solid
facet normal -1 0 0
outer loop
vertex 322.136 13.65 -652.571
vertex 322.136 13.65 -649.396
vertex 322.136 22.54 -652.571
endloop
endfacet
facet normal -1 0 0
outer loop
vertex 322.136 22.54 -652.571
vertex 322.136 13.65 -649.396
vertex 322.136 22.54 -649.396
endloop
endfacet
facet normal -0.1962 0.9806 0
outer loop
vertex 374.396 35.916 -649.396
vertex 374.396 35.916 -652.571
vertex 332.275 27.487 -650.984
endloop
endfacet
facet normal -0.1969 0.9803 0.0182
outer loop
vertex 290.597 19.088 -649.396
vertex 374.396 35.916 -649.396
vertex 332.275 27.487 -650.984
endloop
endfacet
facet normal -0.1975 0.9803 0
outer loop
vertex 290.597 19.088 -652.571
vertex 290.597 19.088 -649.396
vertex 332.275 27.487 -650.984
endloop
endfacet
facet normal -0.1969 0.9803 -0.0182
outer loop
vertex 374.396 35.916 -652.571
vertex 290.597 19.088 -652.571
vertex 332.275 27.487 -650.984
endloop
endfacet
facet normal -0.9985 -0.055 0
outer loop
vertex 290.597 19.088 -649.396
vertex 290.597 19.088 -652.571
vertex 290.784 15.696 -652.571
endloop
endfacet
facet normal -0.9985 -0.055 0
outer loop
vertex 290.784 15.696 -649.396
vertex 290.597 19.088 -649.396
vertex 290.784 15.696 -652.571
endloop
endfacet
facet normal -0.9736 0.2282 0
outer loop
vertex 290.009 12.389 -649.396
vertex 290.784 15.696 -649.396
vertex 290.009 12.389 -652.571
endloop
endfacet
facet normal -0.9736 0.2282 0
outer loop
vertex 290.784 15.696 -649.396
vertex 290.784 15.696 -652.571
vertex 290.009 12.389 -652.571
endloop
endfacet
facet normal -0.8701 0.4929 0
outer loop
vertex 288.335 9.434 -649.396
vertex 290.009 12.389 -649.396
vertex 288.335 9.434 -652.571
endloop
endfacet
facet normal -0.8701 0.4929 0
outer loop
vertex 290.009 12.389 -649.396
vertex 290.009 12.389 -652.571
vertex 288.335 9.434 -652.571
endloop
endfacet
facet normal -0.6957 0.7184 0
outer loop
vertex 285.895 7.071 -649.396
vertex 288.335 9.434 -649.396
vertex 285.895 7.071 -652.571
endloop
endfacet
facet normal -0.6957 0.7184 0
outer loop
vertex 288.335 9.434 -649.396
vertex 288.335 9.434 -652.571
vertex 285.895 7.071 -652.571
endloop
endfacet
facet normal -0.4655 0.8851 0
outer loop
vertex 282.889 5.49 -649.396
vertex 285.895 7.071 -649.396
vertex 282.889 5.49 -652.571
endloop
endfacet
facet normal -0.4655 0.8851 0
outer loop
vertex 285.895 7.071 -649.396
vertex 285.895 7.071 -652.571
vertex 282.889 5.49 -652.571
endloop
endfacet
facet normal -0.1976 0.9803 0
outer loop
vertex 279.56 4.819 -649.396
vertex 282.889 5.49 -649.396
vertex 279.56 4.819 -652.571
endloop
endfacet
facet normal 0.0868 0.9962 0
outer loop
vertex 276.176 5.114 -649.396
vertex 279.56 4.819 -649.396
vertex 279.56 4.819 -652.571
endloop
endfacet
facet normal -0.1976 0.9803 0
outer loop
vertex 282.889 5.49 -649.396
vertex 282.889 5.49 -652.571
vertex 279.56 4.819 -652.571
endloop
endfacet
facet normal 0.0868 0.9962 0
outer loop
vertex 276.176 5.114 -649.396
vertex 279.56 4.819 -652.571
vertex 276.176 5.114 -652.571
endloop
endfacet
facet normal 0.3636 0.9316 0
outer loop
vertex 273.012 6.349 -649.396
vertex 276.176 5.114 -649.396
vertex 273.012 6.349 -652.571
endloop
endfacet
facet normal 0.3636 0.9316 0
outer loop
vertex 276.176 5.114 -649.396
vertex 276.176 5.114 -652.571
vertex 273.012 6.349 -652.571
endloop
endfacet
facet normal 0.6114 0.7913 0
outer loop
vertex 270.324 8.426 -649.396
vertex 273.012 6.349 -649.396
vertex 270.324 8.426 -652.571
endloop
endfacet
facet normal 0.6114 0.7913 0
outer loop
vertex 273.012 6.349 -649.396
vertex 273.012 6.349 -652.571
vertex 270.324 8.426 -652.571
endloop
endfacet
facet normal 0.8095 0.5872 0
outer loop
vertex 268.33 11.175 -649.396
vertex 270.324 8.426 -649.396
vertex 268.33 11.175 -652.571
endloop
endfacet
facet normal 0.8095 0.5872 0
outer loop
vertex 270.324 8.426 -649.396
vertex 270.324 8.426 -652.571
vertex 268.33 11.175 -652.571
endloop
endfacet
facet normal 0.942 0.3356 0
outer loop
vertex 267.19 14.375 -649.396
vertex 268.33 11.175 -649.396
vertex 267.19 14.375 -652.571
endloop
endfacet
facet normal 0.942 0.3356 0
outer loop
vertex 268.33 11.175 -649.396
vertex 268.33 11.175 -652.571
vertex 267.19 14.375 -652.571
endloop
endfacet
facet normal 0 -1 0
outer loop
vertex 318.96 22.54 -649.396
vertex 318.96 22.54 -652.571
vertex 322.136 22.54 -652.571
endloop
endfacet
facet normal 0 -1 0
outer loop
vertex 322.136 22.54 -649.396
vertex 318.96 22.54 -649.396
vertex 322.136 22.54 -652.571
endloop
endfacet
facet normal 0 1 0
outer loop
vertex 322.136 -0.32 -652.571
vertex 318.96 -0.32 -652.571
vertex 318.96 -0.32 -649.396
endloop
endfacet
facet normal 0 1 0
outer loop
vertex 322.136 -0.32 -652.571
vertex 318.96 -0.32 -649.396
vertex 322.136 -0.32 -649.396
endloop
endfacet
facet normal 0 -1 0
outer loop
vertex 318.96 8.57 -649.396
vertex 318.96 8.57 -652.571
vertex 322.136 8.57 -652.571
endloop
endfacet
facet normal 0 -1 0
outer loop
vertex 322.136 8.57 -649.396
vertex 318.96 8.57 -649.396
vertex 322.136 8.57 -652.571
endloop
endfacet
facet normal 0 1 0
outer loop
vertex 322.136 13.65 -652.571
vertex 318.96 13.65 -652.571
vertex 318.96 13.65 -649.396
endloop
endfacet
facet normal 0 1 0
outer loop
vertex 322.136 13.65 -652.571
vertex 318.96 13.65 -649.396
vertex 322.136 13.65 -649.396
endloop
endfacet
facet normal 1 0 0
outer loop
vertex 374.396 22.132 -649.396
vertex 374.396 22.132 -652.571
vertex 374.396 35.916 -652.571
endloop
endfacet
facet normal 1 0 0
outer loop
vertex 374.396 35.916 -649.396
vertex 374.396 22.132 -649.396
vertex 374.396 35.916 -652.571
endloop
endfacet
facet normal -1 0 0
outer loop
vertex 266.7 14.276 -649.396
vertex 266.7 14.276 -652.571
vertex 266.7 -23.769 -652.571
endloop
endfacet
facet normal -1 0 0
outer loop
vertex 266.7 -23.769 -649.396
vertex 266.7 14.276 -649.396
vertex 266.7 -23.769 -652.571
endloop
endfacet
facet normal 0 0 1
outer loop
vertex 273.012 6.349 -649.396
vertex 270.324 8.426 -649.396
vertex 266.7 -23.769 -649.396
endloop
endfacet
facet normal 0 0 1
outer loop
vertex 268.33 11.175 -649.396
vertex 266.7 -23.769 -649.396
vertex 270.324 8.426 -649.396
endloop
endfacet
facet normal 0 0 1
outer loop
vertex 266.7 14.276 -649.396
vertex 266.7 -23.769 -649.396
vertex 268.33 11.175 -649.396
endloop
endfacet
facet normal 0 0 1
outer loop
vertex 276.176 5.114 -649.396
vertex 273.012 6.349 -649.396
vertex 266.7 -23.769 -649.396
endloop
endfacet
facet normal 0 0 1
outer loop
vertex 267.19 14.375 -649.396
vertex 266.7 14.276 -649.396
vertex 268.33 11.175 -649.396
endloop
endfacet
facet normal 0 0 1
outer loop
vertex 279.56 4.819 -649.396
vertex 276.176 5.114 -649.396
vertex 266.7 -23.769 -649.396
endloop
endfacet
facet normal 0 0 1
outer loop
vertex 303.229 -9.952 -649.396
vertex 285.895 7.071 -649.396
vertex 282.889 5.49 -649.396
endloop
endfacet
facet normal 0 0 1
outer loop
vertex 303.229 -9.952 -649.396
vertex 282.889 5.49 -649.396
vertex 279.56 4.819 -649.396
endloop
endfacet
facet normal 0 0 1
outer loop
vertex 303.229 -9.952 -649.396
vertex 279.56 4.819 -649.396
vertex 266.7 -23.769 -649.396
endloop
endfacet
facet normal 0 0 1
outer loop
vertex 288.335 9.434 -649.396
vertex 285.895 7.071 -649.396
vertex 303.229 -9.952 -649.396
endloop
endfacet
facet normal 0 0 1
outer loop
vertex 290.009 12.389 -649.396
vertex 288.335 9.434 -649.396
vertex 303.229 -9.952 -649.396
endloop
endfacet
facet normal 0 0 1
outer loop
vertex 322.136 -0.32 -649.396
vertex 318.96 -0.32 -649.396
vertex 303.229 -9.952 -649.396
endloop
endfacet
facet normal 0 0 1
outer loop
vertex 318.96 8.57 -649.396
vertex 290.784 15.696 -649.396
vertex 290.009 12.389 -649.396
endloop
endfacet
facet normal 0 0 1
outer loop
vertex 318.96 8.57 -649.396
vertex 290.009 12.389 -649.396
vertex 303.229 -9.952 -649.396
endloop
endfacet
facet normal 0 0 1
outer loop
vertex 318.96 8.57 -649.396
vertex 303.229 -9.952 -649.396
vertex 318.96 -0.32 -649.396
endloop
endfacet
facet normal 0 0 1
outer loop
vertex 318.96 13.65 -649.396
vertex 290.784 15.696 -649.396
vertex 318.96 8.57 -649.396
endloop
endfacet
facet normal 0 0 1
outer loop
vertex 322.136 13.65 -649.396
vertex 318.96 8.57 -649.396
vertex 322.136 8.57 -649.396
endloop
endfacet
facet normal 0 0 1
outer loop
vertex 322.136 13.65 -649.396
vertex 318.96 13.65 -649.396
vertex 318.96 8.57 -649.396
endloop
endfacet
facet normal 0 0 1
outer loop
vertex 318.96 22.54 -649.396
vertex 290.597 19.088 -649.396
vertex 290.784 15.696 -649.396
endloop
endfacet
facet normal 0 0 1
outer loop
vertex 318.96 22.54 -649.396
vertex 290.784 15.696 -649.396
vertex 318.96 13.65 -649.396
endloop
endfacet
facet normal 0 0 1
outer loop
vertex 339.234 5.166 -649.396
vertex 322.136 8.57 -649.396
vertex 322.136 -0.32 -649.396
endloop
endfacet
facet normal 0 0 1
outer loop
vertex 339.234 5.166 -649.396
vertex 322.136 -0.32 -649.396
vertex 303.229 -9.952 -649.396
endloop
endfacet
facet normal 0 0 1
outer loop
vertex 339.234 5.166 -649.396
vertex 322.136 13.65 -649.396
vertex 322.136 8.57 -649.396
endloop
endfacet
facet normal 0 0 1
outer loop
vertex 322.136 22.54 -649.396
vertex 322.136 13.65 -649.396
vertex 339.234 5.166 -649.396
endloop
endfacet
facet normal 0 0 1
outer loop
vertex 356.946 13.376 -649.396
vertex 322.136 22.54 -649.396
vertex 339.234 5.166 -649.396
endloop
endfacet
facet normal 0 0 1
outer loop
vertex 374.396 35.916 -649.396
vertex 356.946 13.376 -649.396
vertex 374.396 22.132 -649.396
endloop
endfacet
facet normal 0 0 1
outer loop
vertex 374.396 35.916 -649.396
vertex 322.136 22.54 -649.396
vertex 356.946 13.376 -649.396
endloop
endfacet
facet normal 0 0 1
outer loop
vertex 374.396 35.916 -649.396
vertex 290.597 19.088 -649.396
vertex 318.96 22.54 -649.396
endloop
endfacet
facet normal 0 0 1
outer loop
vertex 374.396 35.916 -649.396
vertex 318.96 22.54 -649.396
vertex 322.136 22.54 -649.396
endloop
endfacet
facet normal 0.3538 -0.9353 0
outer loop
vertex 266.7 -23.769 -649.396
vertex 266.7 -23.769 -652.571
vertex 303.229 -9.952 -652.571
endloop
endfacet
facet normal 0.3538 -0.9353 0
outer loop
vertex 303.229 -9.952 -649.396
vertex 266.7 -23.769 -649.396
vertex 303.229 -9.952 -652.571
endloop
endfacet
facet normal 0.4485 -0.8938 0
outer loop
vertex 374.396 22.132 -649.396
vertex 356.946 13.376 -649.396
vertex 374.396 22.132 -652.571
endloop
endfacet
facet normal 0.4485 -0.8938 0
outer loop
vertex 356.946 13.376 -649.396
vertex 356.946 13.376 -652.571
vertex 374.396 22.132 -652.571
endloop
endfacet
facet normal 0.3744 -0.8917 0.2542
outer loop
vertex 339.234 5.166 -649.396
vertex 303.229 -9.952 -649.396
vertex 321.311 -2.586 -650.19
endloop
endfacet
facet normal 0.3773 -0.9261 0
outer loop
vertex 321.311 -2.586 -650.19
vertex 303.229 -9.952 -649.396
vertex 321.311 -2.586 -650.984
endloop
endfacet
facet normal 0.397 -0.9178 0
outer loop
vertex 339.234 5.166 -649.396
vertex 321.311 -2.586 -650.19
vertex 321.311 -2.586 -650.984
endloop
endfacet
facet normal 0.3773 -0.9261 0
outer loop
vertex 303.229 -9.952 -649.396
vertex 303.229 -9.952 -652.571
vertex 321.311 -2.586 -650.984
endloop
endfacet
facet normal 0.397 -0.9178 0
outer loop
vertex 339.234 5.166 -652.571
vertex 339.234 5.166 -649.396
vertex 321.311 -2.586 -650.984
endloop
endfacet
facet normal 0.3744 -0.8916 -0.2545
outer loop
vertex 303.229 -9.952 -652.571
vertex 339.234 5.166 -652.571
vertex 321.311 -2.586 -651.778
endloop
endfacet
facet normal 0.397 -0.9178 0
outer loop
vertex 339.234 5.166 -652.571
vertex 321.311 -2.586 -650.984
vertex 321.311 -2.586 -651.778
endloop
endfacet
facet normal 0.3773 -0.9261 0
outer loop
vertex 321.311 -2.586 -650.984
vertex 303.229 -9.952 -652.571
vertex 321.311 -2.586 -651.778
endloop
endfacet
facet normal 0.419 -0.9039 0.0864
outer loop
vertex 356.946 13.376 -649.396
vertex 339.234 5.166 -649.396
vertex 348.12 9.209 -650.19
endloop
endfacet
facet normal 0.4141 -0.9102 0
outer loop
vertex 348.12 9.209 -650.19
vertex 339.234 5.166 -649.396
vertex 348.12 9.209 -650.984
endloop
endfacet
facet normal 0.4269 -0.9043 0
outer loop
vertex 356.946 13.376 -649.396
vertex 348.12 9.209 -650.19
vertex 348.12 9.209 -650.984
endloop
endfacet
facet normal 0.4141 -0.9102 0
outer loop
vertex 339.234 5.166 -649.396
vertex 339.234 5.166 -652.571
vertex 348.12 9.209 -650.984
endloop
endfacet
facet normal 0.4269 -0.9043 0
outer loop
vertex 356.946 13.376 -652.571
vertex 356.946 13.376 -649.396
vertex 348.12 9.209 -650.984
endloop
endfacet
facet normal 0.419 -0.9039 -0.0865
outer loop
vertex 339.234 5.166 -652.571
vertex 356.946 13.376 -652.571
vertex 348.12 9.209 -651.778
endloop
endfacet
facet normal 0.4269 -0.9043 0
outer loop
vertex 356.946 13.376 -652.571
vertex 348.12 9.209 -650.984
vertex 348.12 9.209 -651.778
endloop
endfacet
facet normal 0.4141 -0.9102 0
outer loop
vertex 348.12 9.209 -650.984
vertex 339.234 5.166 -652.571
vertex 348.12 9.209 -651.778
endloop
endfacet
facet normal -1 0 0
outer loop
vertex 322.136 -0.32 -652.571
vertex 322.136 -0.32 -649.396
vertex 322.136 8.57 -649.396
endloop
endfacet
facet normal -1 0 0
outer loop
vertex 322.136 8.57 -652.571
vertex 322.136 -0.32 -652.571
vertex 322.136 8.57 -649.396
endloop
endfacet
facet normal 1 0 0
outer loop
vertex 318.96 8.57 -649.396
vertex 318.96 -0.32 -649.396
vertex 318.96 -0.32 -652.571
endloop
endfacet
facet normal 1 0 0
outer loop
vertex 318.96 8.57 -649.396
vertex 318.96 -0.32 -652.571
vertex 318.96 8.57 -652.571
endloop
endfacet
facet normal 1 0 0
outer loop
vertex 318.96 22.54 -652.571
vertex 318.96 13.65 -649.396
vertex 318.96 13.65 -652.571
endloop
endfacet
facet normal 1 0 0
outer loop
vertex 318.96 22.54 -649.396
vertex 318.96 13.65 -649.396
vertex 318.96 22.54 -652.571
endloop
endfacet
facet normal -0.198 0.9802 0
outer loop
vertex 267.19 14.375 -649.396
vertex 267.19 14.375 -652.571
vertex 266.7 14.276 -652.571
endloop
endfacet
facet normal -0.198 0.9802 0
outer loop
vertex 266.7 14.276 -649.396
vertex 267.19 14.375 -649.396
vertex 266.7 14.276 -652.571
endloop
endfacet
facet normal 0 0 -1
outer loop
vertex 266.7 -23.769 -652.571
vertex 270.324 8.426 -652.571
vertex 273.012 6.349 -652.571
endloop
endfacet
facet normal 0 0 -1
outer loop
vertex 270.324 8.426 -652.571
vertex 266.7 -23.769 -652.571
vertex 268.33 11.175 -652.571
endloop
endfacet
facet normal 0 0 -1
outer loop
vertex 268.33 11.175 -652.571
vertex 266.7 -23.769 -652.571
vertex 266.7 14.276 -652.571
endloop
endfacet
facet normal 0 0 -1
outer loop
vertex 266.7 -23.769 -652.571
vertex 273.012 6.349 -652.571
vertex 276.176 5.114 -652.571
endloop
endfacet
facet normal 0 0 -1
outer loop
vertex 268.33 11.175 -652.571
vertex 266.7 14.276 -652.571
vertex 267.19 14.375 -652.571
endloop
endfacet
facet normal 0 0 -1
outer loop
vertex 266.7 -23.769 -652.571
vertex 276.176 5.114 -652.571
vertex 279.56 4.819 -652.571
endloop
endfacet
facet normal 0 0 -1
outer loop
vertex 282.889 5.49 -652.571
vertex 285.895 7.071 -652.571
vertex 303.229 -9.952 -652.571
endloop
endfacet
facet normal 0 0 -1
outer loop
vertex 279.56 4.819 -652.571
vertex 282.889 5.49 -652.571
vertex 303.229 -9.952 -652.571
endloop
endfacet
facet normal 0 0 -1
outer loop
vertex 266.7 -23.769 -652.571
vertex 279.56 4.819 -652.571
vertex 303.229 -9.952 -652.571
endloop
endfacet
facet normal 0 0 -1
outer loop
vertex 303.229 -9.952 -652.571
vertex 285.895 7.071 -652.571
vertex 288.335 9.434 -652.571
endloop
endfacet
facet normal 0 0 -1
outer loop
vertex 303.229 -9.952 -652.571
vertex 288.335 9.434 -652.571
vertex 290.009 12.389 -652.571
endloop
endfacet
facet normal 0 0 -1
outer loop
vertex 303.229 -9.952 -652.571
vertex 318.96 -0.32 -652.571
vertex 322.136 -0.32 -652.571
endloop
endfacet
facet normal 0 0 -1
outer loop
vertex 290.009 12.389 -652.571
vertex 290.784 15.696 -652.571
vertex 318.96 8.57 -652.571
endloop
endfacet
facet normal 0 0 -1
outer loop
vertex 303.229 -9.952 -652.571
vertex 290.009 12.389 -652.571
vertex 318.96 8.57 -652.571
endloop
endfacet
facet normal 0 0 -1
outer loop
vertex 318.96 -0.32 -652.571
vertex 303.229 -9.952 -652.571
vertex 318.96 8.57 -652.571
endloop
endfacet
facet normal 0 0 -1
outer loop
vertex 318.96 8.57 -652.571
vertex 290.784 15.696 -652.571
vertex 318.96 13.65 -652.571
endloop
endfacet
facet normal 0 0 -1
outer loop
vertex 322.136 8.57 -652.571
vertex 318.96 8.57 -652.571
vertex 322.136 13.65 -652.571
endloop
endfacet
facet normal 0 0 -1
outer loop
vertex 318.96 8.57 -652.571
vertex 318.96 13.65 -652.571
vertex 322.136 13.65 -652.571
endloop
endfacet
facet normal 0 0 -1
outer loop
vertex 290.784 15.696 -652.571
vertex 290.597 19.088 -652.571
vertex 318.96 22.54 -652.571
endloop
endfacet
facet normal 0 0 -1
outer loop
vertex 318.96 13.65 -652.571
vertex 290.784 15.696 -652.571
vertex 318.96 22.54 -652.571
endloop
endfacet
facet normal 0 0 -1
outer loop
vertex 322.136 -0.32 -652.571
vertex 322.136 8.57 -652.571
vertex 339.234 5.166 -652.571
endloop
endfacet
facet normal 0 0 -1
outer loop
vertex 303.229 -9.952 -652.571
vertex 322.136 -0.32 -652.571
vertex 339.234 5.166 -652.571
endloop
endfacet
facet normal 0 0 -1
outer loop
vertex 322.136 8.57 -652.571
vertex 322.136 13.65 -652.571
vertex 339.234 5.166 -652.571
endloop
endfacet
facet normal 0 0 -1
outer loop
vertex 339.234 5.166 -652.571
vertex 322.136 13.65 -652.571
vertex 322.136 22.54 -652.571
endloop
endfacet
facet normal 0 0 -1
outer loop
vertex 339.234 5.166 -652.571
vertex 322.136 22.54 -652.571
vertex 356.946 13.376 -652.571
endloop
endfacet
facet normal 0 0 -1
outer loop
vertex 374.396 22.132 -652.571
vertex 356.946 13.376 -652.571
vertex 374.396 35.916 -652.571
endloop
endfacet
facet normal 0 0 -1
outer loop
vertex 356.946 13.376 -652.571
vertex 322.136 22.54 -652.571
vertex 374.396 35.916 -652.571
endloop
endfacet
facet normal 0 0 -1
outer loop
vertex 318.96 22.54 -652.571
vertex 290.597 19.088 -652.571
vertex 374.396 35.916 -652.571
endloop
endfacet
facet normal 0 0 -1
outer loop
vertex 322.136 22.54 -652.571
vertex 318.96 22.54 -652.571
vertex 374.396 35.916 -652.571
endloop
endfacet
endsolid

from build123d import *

# Parameters (mm, degrees)
BOSS_EXTRUDE1_DEPTH = 3.175
SKETCH7_W           = 3.175
SKETCH7_H           = 8.89
CUT_EXTRUDE1_DEPTH  = 377.128183046


with BuildPart() as part:
    # Sketch3 → Boss-Extrude1 (new body)
    with BuildSketch(Plane.XY.offset(-652.571489798)):
        with BuildLine():
            Line((267.190410107, 14.374698747), (266.97653556, 14.331680124))
            Line((266.97653556, 14.331680124), (266.7, 14.276057895))
            Line((266.7, 14.276057895), (266.7, -23.769261632))
            add(Edge.make_bspline(
                [(266.7, -23.769261632), (275.880532182, -20.443051724), (285.029484636, -17.032239756), (303.244718304, -9.989758223), (312.307576038, -6.359638962), (330.31528392, 1.18765824), (339.262942891, 5.105981061), (356.976752757, 13.311628375), (365.744943517, 17.599570981), (374.396, 22.131936474)],
                knots=[0, 0, 0, 0, 0.25, 0.25, 0.5, 0.5, 0.75, 0.75, 1, 1, 1, 1], degree=3))
            Line((374.396, 22.131936474), (374.396, 35.91607659))
            add(Edge.make_bspline(
                [(374.396, 35.91607659), (360.350473035, 33.13205344), (346.312147582, 30.312088758), (318.38150515, 24.690232007), (304.489443265, 21.887076072), (290.596661876, 19.087501725)],
                knots=[0, 0, 0, 0, 0.5, 0.5, 0.994876875, 0.994876875, 0.994876875, 0.994876875], degree=3))
            ThreePointArc((290.596661876, 19.087501725), (290.771522244, 17.918896248), (290.83, 16.738728775))
            ThreePointArc((290.83, 16.738728775), (280.079910741, 4.859978333), (267.190410107, 14.374698747))
        make_face()
    extrude(amount=BOSS_EXTRUDE1_DEPTH)

    # Sketch7 → Cut-Extrude1 (cut, through all)
    with BuildSketch(Plane.XY.offset(-649.396489798)):
        with Locations((320.548, 18.094665768)):
            Rectangle(SKETCH7_W, SKETCH7_H)
        with Locations((320.548, 4.124665768)):
            Rectangle(SKETCH7_W, SKETCH7_H)
    extrude(amount=-CUT_EXTRUDE1_DEPTH, mode=Mode.SUBTRACT)


solid = part.part
